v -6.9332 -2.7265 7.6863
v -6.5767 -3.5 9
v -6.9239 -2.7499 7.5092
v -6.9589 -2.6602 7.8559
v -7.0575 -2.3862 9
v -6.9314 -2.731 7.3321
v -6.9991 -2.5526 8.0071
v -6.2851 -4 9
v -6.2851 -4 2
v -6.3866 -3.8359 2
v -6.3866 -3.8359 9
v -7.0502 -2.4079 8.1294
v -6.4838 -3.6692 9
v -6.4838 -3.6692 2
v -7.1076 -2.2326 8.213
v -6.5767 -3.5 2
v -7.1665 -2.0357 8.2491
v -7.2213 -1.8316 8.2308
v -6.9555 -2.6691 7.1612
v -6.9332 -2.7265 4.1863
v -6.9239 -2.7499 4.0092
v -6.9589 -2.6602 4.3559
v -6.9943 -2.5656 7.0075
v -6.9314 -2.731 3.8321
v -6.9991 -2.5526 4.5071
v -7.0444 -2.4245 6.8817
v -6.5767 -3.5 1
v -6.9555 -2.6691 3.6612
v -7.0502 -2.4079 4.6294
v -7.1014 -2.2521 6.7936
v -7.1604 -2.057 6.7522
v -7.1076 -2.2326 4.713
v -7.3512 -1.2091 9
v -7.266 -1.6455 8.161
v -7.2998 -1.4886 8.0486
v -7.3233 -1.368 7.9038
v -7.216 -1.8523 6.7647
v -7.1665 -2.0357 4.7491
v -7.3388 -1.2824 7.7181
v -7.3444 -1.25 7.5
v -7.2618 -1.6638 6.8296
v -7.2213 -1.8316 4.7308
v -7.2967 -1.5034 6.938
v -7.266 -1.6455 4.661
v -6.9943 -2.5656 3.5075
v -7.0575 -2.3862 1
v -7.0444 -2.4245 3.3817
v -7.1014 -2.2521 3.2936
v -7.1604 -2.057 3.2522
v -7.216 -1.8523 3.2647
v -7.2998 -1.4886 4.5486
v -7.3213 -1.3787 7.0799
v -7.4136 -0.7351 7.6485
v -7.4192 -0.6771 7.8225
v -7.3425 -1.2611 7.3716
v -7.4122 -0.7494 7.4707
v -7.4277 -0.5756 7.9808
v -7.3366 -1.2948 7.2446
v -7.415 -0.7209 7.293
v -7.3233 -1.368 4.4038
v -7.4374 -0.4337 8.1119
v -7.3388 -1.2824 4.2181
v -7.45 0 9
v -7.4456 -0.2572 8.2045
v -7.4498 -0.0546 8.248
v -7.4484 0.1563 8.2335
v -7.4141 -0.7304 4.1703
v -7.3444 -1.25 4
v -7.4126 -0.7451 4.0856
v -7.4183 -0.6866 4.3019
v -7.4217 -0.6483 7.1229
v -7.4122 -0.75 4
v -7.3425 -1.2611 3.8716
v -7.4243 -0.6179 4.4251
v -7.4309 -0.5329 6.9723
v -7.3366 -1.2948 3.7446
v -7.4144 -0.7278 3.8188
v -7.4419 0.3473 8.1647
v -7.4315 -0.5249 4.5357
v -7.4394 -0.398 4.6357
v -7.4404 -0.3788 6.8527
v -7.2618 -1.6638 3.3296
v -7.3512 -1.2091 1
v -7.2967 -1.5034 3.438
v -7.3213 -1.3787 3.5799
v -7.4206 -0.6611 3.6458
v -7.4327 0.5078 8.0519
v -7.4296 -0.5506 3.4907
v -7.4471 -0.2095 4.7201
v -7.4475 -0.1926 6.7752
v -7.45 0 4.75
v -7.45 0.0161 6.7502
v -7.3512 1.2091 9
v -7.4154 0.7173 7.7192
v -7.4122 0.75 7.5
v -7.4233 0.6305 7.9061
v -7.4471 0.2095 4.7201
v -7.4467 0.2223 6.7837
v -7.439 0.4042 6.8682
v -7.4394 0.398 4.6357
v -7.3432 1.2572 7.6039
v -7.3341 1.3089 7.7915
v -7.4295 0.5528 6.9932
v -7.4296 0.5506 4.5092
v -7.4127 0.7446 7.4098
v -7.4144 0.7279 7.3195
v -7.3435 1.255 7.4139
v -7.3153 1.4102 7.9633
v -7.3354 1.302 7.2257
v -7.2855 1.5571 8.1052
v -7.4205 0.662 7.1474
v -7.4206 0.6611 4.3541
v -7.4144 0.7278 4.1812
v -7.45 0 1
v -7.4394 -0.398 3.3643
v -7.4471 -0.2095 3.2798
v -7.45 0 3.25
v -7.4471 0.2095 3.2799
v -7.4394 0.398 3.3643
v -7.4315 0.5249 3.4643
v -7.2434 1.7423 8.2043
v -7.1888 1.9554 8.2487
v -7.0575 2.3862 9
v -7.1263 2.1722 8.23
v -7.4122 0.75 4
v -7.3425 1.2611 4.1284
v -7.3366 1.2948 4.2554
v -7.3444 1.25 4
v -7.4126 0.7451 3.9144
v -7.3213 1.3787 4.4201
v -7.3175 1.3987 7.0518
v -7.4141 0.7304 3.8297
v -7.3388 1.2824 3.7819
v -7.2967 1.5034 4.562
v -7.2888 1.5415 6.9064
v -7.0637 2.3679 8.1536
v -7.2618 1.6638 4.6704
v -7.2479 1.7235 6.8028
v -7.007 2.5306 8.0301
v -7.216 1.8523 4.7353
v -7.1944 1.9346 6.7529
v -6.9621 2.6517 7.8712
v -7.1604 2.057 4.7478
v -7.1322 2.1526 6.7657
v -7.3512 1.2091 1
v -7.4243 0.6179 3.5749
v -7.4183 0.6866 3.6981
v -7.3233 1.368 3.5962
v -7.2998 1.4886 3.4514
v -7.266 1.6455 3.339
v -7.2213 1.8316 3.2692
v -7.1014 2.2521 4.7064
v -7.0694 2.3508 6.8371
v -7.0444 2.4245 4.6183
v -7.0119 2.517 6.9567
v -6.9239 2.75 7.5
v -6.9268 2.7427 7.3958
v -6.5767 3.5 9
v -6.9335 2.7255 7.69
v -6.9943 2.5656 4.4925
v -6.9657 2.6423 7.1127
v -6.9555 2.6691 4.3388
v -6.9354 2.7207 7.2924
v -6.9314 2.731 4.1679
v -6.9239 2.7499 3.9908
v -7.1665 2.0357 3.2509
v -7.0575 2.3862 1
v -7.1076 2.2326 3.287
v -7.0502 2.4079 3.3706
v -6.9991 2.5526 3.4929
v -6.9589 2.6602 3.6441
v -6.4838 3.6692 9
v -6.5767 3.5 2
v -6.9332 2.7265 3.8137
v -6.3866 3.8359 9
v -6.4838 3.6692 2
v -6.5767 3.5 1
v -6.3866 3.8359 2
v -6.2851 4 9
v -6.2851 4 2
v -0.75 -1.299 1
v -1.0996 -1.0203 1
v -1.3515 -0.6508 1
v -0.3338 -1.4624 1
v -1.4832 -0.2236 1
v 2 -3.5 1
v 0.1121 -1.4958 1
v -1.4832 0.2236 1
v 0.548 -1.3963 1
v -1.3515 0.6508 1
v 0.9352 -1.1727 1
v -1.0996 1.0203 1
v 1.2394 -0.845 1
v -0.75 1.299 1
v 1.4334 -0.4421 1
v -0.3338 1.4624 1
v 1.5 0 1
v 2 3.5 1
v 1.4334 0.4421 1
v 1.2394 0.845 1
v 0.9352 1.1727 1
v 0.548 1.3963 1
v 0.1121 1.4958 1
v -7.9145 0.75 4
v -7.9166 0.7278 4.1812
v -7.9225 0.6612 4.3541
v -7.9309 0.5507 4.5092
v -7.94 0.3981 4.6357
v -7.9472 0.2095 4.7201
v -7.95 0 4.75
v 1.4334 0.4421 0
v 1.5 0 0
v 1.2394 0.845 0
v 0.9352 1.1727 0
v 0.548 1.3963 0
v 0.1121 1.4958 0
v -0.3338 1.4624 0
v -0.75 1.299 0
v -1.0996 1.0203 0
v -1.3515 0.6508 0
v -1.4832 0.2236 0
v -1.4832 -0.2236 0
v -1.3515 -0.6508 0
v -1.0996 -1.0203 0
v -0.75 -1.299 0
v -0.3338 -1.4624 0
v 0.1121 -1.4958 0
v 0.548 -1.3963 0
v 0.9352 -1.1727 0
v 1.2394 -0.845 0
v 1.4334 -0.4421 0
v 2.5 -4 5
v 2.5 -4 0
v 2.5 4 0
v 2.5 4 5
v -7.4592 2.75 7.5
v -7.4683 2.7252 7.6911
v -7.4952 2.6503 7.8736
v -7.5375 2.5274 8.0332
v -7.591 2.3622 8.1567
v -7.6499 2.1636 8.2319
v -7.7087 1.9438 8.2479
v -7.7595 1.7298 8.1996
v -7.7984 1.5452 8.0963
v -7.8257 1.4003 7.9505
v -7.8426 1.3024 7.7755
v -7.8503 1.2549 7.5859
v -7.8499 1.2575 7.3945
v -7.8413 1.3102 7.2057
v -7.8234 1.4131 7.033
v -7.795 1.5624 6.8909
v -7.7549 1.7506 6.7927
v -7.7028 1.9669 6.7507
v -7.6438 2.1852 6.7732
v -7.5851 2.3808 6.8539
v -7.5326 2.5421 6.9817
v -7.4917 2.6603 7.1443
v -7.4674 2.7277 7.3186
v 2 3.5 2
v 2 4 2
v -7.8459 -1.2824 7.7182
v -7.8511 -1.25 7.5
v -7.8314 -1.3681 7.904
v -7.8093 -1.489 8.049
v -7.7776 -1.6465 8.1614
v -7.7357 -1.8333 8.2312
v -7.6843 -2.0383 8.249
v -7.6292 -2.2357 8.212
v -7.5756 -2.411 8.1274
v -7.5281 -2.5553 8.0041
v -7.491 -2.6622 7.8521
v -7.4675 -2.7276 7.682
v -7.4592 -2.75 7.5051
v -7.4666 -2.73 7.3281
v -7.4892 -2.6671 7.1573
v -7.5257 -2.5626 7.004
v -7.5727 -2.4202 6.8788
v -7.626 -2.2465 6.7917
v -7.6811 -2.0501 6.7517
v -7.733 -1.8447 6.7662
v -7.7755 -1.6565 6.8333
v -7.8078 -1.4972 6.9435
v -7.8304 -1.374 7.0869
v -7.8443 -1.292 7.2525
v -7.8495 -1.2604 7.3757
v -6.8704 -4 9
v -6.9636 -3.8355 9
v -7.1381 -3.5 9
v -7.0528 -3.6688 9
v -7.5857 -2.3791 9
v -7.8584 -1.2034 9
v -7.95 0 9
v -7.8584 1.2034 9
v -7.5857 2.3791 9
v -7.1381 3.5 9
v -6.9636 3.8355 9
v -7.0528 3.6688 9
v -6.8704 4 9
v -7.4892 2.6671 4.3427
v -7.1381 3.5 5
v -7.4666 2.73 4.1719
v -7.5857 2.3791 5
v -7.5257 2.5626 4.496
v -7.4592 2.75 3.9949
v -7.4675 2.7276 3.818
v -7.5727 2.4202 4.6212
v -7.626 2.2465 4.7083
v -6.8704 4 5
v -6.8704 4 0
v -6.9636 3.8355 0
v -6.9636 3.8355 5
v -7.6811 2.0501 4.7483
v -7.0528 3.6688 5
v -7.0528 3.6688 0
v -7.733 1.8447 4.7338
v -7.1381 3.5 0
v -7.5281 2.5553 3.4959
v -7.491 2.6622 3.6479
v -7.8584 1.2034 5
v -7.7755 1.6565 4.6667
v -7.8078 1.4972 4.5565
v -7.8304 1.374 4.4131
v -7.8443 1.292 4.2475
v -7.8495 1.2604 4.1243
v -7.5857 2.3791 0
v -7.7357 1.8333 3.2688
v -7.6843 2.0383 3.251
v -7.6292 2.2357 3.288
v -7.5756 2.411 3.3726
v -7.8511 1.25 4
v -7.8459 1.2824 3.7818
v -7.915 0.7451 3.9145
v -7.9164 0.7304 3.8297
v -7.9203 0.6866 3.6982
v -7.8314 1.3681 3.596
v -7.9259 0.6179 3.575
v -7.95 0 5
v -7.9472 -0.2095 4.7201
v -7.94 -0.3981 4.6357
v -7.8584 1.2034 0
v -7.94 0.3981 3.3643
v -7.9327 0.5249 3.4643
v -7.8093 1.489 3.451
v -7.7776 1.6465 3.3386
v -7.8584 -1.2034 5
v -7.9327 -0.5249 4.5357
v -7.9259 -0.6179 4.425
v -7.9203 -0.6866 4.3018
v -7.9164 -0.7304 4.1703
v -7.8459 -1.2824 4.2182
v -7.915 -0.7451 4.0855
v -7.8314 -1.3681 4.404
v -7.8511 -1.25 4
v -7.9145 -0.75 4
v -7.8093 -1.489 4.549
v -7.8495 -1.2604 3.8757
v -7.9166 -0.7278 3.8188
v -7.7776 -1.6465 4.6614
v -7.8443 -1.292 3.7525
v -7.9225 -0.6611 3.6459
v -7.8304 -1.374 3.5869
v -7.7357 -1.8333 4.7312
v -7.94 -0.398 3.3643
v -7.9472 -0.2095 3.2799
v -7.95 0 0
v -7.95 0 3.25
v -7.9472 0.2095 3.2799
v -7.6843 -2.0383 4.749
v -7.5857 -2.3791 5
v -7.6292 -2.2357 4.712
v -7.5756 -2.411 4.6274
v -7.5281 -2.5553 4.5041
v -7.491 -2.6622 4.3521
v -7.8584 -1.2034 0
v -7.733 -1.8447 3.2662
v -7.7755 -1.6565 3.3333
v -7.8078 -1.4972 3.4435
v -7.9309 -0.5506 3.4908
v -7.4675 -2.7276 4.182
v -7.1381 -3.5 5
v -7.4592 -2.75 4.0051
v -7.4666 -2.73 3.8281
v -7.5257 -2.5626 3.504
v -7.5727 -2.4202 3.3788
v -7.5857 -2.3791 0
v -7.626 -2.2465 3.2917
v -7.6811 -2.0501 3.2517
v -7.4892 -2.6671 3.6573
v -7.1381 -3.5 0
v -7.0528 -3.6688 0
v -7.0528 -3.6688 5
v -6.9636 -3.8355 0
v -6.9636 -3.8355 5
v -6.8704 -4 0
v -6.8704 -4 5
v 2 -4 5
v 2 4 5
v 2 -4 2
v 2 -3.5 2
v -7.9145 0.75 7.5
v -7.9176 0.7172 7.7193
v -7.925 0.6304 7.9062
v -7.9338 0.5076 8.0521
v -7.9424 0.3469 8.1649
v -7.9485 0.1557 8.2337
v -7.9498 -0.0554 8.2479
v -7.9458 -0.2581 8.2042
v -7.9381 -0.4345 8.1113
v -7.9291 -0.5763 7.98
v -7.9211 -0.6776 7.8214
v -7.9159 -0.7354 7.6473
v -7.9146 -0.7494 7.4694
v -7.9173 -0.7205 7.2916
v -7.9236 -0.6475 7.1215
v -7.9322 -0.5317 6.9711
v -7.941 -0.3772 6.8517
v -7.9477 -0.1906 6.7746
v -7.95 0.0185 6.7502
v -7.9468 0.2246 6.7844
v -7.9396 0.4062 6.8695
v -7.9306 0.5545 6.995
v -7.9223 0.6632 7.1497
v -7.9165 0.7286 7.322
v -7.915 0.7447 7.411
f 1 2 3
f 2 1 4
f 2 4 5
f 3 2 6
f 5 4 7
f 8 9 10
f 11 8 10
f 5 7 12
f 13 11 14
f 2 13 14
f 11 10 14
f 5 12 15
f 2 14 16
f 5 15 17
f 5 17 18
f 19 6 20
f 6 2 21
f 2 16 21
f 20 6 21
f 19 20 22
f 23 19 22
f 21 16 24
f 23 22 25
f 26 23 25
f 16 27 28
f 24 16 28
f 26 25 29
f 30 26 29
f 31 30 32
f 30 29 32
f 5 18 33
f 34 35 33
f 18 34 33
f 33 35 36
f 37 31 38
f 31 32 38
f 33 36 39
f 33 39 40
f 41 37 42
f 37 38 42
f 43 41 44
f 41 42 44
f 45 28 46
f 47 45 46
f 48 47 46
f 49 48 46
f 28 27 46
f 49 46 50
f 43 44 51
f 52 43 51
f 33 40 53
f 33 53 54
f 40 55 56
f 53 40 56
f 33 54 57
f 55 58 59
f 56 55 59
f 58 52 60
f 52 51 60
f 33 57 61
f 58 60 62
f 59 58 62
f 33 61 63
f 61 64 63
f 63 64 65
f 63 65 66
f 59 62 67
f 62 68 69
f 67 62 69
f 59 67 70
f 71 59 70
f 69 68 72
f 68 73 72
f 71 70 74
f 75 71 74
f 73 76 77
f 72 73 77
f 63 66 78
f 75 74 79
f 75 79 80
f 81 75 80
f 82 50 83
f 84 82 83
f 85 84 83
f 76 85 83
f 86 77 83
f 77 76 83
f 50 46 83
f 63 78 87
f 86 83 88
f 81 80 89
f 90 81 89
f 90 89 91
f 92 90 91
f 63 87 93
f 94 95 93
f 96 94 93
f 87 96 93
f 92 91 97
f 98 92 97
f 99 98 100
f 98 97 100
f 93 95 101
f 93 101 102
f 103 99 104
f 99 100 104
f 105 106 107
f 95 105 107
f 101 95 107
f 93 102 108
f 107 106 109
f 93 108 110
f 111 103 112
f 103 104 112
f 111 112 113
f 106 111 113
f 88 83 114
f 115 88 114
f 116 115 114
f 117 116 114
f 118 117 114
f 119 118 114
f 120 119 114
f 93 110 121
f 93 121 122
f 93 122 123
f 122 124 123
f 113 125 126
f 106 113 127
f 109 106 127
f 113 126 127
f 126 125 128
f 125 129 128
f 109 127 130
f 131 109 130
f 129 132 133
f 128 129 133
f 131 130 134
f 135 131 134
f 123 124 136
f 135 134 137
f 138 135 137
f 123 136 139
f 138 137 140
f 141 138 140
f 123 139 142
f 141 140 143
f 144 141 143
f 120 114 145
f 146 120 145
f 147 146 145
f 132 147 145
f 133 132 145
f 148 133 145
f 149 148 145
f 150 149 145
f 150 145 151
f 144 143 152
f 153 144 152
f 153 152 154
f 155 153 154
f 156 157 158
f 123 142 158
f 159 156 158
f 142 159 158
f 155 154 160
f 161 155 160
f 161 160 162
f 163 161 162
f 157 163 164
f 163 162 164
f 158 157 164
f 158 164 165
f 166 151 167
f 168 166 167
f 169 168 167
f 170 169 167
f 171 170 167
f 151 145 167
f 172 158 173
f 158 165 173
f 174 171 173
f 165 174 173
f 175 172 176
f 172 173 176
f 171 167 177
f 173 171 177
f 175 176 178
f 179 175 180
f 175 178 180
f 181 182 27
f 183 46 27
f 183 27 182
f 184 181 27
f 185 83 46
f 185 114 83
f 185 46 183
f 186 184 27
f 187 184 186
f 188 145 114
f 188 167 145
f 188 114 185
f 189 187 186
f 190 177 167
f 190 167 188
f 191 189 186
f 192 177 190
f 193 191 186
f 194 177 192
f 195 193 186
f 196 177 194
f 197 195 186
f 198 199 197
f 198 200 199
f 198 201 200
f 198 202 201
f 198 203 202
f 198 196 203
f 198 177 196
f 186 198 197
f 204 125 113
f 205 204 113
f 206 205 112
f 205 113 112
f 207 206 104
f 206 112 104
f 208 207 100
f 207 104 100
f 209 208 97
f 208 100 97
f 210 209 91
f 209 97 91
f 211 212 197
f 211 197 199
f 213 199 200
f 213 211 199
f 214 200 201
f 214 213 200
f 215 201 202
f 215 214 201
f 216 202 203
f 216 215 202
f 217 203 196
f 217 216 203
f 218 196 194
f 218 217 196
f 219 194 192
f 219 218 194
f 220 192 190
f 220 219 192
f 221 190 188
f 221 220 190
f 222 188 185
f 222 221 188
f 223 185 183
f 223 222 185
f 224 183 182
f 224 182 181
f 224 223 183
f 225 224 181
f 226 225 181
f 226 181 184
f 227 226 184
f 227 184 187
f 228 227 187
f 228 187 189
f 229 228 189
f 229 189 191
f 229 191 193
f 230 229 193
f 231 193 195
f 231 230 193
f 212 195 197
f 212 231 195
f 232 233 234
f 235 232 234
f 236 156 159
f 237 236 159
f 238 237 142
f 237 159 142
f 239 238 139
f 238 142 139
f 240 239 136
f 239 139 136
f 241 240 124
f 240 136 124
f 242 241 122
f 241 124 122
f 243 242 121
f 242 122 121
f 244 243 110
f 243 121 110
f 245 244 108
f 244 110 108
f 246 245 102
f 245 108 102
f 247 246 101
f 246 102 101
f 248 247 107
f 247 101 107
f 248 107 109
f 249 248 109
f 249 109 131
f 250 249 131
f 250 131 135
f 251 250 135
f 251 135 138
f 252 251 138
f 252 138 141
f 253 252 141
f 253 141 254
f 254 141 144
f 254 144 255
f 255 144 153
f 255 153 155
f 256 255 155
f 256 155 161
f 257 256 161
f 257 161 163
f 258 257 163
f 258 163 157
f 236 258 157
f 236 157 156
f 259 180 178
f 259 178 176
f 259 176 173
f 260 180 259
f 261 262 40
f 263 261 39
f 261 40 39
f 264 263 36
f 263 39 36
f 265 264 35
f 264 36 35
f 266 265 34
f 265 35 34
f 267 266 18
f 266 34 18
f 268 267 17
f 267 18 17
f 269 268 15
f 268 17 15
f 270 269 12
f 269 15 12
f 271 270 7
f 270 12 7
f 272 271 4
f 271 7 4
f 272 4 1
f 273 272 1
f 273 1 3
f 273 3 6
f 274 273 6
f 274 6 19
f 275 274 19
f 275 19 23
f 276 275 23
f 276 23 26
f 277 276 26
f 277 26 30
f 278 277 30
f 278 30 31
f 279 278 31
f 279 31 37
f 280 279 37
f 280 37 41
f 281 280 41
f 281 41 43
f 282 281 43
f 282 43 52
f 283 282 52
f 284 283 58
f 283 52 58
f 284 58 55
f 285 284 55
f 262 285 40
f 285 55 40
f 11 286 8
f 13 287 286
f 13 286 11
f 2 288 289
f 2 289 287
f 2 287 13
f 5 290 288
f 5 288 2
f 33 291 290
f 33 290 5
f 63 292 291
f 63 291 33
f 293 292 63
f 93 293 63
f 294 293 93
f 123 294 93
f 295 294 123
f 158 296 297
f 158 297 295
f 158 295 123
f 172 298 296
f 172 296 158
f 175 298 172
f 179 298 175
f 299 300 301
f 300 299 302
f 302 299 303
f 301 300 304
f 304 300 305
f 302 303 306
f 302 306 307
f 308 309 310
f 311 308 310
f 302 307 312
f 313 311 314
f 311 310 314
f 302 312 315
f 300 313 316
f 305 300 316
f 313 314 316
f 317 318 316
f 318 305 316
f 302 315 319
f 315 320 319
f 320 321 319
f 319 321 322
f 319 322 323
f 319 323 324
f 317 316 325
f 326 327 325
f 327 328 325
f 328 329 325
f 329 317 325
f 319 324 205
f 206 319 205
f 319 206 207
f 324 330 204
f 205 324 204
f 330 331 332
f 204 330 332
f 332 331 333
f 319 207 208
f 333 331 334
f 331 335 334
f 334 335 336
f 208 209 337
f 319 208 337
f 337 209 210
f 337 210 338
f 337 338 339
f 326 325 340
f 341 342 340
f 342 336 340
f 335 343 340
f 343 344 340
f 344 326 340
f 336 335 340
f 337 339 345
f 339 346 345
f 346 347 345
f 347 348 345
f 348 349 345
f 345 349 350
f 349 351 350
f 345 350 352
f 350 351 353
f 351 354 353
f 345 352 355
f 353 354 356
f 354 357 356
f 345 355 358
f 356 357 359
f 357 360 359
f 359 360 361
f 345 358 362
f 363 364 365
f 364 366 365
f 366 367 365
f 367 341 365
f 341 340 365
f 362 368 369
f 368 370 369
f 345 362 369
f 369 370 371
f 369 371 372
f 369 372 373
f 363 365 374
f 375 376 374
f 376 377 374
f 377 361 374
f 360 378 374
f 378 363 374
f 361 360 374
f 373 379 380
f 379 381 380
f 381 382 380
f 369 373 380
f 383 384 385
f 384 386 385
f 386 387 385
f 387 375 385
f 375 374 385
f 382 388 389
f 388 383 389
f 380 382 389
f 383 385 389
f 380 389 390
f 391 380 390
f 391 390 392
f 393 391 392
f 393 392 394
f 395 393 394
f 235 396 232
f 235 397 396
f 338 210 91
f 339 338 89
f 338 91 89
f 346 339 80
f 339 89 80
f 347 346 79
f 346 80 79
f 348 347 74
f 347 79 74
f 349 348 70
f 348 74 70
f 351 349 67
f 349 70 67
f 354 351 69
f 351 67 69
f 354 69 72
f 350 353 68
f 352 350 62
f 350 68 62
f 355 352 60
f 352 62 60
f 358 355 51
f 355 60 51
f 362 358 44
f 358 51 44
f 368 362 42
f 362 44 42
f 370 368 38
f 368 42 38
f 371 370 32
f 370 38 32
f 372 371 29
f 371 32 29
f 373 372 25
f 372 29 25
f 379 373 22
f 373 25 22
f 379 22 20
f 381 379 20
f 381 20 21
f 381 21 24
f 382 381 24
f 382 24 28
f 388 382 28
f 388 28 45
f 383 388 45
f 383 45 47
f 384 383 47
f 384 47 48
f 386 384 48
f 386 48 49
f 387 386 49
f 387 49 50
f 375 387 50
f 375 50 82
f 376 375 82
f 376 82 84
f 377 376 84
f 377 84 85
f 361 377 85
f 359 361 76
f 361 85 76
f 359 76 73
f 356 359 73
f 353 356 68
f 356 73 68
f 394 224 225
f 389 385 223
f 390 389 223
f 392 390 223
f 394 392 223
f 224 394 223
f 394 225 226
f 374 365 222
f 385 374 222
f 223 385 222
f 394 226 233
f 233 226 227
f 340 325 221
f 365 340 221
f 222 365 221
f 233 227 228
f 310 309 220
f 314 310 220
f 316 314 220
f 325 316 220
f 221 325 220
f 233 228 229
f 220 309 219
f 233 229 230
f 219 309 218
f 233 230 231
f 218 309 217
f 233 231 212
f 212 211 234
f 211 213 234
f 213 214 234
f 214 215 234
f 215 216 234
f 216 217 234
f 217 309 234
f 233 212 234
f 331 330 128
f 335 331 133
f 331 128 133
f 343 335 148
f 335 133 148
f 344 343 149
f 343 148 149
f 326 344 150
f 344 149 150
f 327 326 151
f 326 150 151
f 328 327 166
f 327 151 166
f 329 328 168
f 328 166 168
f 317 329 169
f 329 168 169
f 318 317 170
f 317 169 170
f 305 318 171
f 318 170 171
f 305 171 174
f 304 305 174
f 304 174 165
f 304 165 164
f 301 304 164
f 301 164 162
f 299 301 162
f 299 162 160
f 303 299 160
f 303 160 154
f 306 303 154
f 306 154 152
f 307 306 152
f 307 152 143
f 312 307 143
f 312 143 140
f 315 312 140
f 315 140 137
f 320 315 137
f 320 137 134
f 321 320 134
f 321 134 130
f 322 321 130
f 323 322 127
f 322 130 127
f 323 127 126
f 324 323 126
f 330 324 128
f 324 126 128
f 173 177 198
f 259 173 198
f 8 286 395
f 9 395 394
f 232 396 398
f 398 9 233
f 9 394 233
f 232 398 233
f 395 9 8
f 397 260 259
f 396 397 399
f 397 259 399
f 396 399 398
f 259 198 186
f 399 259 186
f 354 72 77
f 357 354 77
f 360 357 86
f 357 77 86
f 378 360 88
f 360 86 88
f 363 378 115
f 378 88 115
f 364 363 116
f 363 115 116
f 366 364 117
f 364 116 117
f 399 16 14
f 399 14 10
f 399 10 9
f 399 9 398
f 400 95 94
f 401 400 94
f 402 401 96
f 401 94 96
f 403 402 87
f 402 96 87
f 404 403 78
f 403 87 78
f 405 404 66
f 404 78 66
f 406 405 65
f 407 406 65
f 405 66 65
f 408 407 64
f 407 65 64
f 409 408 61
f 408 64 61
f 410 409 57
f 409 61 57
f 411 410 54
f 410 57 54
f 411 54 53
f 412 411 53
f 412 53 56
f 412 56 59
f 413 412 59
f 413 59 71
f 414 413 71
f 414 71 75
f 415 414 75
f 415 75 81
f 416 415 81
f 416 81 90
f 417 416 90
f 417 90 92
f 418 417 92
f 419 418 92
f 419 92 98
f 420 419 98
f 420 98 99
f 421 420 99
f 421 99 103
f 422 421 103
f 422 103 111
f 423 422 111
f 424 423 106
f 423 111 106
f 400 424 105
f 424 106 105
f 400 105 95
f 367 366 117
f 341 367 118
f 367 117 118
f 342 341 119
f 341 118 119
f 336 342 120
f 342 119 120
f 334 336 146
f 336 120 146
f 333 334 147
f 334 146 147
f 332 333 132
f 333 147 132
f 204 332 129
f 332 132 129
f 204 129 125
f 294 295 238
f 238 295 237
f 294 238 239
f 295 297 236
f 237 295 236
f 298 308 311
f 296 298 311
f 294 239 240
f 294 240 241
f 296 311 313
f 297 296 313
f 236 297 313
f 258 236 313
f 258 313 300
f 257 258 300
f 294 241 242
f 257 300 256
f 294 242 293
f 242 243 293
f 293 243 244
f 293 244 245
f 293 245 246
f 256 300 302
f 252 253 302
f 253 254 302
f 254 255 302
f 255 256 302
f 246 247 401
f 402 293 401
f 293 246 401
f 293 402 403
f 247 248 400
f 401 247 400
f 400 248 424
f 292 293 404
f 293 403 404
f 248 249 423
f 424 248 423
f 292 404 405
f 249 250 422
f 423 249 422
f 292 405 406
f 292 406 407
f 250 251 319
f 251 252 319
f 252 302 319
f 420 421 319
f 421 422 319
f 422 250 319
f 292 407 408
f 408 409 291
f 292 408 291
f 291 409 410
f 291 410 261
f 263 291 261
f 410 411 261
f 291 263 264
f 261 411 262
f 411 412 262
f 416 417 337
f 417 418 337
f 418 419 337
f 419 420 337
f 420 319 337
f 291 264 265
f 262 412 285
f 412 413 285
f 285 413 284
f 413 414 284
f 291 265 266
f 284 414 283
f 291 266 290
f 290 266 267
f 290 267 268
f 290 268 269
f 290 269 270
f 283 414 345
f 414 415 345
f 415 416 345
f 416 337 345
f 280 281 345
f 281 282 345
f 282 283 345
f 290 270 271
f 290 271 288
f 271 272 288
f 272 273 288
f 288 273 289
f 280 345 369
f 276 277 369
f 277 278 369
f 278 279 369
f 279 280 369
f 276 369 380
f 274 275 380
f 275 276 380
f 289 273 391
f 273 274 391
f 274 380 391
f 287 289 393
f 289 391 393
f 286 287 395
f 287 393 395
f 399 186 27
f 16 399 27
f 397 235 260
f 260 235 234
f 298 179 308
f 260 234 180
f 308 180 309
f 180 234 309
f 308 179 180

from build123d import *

# Parameters (mm, degrees)
F0_R     = 1.5
F0_W     = 0.5
F0_H     = 3.5
F0_H_2   = 0.5
F1_DEPTH = 1
F2_DEPTH = 5
F3_DEPTH = 2
F4_DEPTH = 4
F5_R     = 0.75
F6_DEPTH = 25


with BuildPart() as f1:
    # F0 (on Top) → F1 (new body)
    with BuildSketch(Plane.XY):
        with BuildLine():
            Line((2, -3.5), (2, 0))
            Line((2, 0), (2, 3.5))
            Line((2, 3.5), (-6.5766632877, 3.5))
            ThreePointArc((-6.5766632877, 3.5), (-7.45, 0), (-6.5766632877, -3.5))
            Line((-6.5766632877, -3.5), (2, -3.5))
        make_face()
        Circle(F0_R, mode=Mode.SUBTRACT)
        with Locations((2.25, -1.75)):
            Rectangle(F0_W, F0_H)
        with Locations((2.25, 1.75)):
            Rectangle(F0_W, F0_H)
        with BuildLine():
            ThreePointArc((-6.2851014312, -4), (-6.4357398892, -3.7528325408), (-6.5766632877, -3.5))
            Line((-6.5766632877, -3.5), (-7.1381019886, -3.5))
            ThreePointArc((-7.1381019886, -3.5), (-7.0087149266, -3.7523879167), (-6.8704075571, -4))
            Line((-6.8704075571, -4), (-6.2851014312, -4))
        make_face()
        with BuildLine():
            Line((-7.1381019886, 3.5), (-6.5766632877, 3.5))
            ThreePointArc((-6.5766632877, 3.5), (-6.4357398892, 3.7528325408), (-6.2851014312, 4))
            Line((-6.2851014312, 4), (-6.8704075571, 4))
            ThreePointArc((-6.8704075571, 4), (-7.0087149266, 3.7523879167), (-7.1381019886, 3.5))
        make_face()
        with Locations((2.25, 3.75)):
            Rectangle(F0_W, F0_H_2)
        with Locations((2.25, -3.75)):
            Rectangle(F0_W, F0_H_2)
        with BuildLine():
            ThreePointArc((-6.5766632877, -3.5), (-7.45, 0), (-6.5766632877, 3.5))
            Line((-6.5766632877, 3.5), (-7.1381019886, 3.5))
            ThreePointArc((-7.1381019886, 3.5), (-7.95, 0), (-7.1381019886, -3.5))
            Line((-7.1381019886, -3.5), (-6.5766632877, -3.5))
        make_face()
        with BuildLine():
            Line((-6.5766632877, 3.5), (2, 3.5))
            Line((2, 3.5), (2, 4))
            Line((2, 4), (-6.2851014312, 4))
            ThreePointArc((-6.2851014312, 4), (-6.4357398892, 3.7528325408), (-6.5766632877, 3.5))
        make_face()
        with BuildLine():
            Line((2, -4), (2, -3.5))
            Line((2, -3.5), (-6.5766632877, -3.5))
            ThreePointArc((-6.5766632877, -3.5), (-6.4357398892, -3.7528325408), (-6.2851014312, -4))
            Line((-6.2851014312, -4), (2, -4))
        make_face()
    extrude(amount=F1_DEPTH)

    # F0 (on Top) → F2 (join)
    with BuildSketch(Plane.XY):
        with Locations((2.25, -1.75)):
            Rectangle(F0_W, F0_H)
        with Locations((2.25, 1.75)):
            Rectangle(F0_W, F0_H)
        with BuildLine():
            ThreePointArc((-6.2851014312, -4), (-6.4357398892, -3.7528325408), (-6.5766632877, -3.5))
            Line((-6.5766632877, -3.5), (-7.1381019886, -3.5))
            ThreePointArc((-7.1381019886, -3.5), (-7.0087149266, -3.7523879167), (-6.8704075571, -4))
            Line((-6.8704075571, -4), (-6.2851014312, -4))
        make_face()
        with Locations((2.25, -3.75)):
            Rectangle(F0_W, F0_H_2)
        with Locations((2.25, 3.75)):
            Rectangle(F0_W, F0_H_2)
        with BuildLine():
            Line((-7.1381019886, 3.5), (-6.5766632877, 3.5))
            ThreePointArc((-6.5766632877, 3.5), (-6.4357398892, 3.7528325408), (-6.2851014312, 4))
            Line((-6.2851014312, 4), (-6.8704075571, 4))
            ThreePointArc((-6.8704075571, 4), (-7.0087149266, 3.7523879167), (-7.1381019886, 3.5))
        make_face()
        with BuildLine():
            ThreePointArc((-6.5766632877, -3.5), (-7.45, 0), (-6.5766632877, 3.5))
            Line((-6.5766632877, 3.5), (-7.1381019886, 3.5))
            ThreePointArc((-7.1381019886, 3.5), (-7.95, 0), (-7.1381019886, -3.5))
            Line((-7.1381019886, -3.5), (-6.5766632877, -3.5))
        make_face()
    extrude(amount=F2_DEPTH)

    # F0 (on Top) → F3 (join)
    with BuildSketch(Plane.XY):
        with BuildLine():
            Line((2, -4), (2, -3.5))
            Line((2, -3.5), (-6.5766632877, -3.5))
            ThreePointArc((-6.5766632877, -3.5), (-6.4357398892, -3.7528325408), (-6.2851014312, -4))
            Line((-6.2851014312, -4), (2, -4))
        make_face()
        with BuildLine():
            Line((-6.5766632877, 3.5), (2, 3.5))
            Line((2, 3.5), (2, 4))
            Line((2, 4), (-6.2851014312, 4))
            ThreePointArc((-6.2851014312, 4), (-6.4357398892, 3.7528325408), (-6.5766632877, 3.5))
        make_face()
    extrude(amount=F3_DEPTH)

    # F4 (add): a face of the model
    f4_faces = [f1.faces().sort_by_distance(p)[0] for p in [
        (-7.5317140669, 0, 5),
    ]]
    extrude(f4_faces, amount=F4_DEPTH)

    # F5 (on Right) → F6 (cut)
    with BuildSketch(Plane.YZ):
        with BuildLine():
            ThreePointArc((2.75, 4), (2, 4.75), (1.25, 4))
            ThreePointArc((1.25, 4), (2, 3.25), (2.75, 4))
        make_face()
        with BuildLine():
            Line((0, 4), (0, 3.25))
            ThreePointArc((0, 3.25), (0.5303300859, 3.4696699141), (0.75, 4))
            Line((0.75, 4), (0, 4))
        make_face()
        with BuildLine():
            Line((0, 4.75), (0, 4))
            Line((0, 4), (0.75, 4))
            ThreePointArc((0.75, 4), (0.5303300859, 4.5303300859), (0, 4.75))
        make_face()
        with BuildLine():
            ThreePointArc((-0.75, 4), (-0.5303300859, 3.4696699141), (0, 3.25))
            Line((0, 3.25), (0, 4))
            Line((0, 4), (-0.75, 4))
        make_face()
        with Locations((-2, 4)):
            Circle(F5_R)
        with BuildLine():
            Line((-0.75, 4), (0, 4))
            Line((0, 4), (0, 4.75))
            ThreePointArc((0, 4.75), (-0.5303300859, 4.5303300859), (-0.75, 4))
        make_face()
        with Locations((2, 7.5)):
            Circle(F5_R)
        with Locations((0, 7.5)):
            Circle(F5_R)
        with Locations((-2, 7.5)):
            Circle(F5_R)
    extrude(amount=-F6_DEPTH, mode=Mode.SUBTRACT)


solid = f1.part
